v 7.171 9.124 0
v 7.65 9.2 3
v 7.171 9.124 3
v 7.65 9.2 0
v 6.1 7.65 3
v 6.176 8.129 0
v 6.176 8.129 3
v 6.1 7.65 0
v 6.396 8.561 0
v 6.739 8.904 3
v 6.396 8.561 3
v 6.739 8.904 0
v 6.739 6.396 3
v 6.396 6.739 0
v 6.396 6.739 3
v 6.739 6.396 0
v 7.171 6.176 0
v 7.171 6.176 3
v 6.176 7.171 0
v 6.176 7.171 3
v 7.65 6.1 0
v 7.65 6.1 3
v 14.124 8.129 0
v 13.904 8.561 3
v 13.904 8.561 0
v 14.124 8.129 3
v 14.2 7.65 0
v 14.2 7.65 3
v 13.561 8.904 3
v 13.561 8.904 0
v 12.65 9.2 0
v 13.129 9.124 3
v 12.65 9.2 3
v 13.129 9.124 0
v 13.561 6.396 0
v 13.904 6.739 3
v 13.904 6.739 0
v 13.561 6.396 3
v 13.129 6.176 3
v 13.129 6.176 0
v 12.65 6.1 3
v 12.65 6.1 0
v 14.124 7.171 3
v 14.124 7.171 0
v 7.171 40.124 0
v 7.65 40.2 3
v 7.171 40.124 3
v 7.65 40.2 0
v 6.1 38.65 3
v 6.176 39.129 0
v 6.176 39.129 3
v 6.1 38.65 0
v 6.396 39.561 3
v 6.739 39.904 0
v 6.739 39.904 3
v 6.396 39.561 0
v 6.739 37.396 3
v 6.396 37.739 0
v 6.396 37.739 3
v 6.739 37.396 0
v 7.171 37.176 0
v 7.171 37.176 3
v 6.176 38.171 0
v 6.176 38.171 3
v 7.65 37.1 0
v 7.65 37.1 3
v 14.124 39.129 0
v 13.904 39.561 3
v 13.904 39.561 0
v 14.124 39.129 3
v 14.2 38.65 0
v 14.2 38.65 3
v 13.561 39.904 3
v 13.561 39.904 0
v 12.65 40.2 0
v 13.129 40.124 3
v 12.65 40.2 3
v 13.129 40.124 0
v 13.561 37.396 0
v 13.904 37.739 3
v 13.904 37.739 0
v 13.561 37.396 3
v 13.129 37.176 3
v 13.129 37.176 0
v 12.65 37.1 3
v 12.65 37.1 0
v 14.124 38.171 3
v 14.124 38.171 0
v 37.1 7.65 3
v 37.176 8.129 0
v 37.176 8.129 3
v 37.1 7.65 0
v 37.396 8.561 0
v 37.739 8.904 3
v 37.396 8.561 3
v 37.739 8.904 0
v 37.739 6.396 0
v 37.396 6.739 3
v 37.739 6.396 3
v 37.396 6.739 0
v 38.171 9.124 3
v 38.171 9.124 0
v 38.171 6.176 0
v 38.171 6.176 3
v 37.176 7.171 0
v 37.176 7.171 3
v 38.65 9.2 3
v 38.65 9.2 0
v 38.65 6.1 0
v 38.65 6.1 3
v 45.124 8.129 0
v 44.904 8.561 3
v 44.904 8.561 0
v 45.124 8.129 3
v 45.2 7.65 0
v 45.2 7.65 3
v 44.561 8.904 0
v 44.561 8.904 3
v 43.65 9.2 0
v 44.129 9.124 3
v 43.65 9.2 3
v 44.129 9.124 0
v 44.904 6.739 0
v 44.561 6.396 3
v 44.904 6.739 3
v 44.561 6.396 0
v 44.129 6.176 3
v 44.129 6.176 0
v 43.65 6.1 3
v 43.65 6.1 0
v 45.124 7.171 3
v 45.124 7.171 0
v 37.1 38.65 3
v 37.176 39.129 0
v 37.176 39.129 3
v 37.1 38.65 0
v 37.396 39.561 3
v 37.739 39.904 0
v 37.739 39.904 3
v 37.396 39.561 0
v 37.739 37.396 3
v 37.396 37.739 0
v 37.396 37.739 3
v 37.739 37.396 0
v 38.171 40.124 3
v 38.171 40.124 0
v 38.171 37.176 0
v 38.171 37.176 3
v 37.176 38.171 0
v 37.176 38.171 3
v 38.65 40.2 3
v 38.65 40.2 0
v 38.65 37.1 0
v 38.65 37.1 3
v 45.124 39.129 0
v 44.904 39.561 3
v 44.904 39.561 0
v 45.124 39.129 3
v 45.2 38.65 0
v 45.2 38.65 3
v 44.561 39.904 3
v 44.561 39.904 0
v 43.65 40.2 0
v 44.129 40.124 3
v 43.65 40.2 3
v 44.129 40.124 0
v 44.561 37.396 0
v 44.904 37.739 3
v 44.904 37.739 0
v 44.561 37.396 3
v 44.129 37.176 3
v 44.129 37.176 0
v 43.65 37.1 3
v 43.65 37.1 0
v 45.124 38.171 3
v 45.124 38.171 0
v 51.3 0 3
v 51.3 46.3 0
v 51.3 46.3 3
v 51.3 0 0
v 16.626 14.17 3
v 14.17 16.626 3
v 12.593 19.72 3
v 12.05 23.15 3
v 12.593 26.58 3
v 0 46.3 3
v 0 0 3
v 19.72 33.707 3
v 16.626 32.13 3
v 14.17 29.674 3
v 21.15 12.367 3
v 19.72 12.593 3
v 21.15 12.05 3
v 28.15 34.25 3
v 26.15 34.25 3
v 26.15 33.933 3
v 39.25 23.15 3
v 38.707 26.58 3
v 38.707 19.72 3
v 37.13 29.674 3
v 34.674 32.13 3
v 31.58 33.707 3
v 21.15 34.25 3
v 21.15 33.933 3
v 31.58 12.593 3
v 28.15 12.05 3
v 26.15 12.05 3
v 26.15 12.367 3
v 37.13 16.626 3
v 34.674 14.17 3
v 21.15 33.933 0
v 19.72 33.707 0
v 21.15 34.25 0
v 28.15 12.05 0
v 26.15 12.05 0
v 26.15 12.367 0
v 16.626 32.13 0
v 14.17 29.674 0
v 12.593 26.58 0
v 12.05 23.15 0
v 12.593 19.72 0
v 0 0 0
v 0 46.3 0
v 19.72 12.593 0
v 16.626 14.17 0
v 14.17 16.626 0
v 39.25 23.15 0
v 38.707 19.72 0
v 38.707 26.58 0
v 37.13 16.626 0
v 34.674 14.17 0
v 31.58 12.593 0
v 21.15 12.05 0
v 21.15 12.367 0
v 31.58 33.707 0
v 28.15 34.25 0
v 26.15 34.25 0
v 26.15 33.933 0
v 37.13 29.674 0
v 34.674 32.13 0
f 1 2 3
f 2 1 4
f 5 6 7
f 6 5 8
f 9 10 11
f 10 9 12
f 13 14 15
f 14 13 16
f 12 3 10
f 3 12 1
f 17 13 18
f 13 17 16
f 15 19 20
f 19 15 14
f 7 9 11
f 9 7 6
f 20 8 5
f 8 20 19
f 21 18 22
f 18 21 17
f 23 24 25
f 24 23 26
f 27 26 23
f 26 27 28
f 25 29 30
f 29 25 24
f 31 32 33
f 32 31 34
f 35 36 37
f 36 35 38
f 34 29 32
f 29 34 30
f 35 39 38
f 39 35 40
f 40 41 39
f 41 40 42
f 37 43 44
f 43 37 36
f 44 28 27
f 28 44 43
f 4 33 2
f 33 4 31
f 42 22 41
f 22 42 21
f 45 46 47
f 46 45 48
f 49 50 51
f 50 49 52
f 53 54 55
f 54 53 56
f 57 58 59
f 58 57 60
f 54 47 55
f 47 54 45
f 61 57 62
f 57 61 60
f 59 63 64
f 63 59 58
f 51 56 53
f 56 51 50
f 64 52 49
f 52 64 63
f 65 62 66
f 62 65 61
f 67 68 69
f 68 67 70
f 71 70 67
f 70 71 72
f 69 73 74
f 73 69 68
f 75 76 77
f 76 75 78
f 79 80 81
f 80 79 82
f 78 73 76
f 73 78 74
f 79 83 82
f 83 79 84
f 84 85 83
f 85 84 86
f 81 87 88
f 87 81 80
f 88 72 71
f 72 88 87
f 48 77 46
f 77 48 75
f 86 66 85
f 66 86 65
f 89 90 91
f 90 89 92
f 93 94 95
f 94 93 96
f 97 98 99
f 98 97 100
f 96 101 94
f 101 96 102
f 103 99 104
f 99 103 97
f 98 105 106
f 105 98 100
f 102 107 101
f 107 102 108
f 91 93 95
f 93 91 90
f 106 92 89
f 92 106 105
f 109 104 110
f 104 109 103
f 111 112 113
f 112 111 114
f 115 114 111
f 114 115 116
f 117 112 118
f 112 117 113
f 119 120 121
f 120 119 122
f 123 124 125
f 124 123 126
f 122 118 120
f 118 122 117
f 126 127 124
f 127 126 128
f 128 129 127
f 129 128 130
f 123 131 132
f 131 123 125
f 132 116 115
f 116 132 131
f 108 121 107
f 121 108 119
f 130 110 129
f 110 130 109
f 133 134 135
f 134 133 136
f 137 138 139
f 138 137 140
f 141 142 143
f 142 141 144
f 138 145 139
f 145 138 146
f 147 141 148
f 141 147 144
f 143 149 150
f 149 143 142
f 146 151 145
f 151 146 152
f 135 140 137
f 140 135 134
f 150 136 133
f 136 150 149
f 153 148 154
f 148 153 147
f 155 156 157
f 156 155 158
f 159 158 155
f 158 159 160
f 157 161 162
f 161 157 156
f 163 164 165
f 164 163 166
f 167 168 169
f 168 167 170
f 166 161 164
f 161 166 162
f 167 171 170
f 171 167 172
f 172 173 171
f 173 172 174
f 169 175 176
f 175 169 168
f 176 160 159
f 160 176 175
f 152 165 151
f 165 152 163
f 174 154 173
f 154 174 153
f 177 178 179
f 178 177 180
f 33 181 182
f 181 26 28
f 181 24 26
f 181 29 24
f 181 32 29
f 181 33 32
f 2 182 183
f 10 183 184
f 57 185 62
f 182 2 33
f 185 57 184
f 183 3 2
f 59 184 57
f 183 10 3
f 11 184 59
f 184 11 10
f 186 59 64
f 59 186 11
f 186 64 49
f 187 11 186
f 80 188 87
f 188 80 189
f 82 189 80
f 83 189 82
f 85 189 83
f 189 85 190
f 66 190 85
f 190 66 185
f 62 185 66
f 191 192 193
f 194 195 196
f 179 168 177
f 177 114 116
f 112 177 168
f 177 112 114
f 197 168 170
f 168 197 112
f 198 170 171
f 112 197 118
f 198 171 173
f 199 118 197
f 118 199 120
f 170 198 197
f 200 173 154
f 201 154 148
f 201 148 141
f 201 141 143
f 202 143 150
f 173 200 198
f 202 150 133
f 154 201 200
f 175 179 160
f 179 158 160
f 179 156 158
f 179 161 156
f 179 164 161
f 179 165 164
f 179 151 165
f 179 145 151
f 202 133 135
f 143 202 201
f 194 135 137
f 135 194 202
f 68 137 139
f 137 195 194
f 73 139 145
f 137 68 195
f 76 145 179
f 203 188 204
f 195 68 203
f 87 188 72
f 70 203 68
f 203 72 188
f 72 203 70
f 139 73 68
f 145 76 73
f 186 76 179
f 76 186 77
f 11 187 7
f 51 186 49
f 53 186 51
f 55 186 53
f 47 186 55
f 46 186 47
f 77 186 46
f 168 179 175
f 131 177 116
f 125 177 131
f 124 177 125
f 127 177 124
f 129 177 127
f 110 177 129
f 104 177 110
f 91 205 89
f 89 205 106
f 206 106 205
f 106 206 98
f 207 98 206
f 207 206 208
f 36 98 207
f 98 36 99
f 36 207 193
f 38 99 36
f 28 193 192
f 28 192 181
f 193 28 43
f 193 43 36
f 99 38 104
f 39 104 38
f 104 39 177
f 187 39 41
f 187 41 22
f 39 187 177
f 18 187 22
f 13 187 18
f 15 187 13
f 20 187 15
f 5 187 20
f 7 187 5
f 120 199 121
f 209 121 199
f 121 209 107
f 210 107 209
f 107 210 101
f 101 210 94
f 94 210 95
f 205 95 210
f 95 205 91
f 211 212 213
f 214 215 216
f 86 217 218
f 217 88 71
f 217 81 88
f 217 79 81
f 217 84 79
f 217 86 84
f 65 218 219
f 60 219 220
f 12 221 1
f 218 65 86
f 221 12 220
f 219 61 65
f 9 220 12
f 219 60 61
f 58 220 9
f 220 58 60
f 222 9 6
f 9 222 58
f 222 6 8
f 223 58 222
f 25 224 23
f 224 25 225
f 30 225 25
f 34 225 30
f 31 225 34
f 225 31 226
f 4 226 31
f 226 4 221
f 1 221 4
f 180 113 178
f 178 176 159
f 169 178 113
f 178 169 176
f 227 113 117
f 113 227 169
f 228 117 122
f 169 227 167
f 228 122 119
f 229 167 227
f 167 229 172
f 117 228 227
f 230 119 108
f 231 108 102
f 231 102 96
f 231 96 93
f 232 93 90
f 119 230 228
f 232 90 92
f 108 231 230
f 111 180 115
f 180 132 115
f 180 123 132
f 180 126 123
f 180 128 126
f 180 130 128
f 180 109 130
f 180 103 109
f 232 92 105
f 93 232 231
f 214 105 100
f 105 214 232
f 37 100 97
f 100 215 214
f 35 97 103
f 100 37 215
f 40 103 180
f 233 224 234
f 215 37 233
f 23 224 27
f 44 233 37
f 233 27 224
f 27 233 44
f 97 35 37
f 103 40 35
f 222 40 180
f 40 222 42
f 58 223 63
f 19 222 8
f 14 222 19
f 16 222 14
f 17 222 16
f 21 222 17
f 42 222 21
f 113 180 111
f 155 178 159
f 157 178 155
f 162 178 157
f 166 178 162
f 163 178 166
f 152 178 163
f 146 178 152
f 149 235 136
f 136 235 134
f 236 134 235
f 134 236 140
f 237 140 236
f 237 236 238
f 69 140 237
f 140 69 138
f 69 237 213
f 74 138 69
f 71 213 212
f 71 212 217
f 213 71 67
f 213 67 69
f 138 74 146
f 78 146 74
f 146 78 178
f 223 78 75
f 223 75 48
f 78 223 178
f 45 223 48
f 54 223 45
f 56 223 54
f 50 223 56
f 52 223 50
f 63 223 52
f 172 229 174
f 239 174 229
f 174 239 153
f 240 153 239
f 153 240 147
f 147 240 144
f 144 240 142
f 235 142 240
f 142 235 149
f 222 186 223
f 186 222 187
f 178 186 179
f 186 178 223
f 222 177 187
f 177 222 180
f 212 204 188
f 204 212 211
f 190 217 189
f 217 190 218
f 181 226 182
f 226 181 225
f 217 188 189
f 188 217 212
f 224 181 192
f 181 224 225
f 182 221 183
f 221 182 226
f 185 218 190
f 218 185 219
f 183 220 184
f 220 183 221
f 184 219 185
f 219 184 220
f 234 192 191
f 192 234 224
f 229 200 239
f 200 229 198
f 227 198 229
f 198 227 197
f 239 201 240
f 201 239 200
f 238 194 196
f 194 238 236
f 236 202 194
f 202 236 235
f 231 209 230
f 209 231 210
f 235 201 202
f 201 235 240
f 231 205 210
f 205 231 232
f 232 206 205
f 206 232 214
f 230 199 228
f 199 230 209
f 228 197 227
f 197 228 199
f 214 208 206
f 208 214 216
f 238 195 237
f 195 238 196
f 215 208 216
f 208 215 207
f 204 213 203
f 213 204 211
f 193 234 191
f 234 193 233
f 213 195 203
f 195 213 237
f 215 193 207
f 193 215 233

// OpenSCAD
module draw_nema(v, length)
{
	// Body size
	bs = v[0];
	// Hole spacing
	hs = v[1];
	// Hole offset
	ho = (bs - hs) / 2;
	// Hole diameter
	hd = v[2];
	// Hole radius
	hr = hd / 2;
	// Hole depth
	hd = v[3];
	// Center
	c = bs / 2;
	// Shoulder height
	sh = v[4];
	// Shoulder diameter
	sd = v[5];
	// shoulder radius
	sr = sd / 2;
	// Shaft length
	sfl = v[6];
	// Shaft diameter
	sfd = v[7];
	// Shaft radius
	sfr = sfd / 2;

	echo(bs);
	echo (bs-ho);

	difference()
	{
		union()
		{
			color([0.5,0.5,0.5]) cube([bs,length,bs]);
			translate([c,-sh,c]) rotate([270,0,0])
				color([0.7,0.7,0.7]) cylinder(r = sr, h = sh);
			translate([c,-sfl,c]) rotate([270,0,0])
				color([0.8,0.8,0.8]) cylinder(r = sfr, h = sfl);
		}
		translate([ho,-0.1,ho]) rotate([270,0,0])
			cylinder(r = hr, h = hd + 0.1);
		translate([bs-ho,-0.1,ho]) rotate([270,0,0])
			cylinder(r = hr, h = hd + 0.1);
		translate([ho,-0.1,bs-ho]) rotate([270,0,0])
			cylinder(r = hr, h = hd + 0.1);
		translate([bs-ho,-0.1,bs-ho]) rotate([270,0,0])
			cylinder(r = hr, h = hd + 0.1);
	}
}

module draw_nema_plate(v, slot_len=0, thickness = 3, margin = 0)
{
	// Body size
	bs = v[0];
	// Hole spacing
	hs = v[1];
	// Hole diameter
	hd = v[2];
	// Hole radius
	hr = hd / 2;
	// Total slot len
	tsl = slot_len + hd;
	// Total len
	len = bs + slot_len + (margin * 2);
	// Total hgt
	hgt = bs + (margin * 2);
	// Center
	c_y = hgt / 2;
	c_x = len / 2;
	// Hole offset from ctr
	ho = hs / 2;
	// Shoulder diameter
	sd = v[5];
	// shoulder radius
	sr = sd / 2;

	difference()
	{
		cube([len, hgt, thickness]);
		translate([c_x - (slot_len / 2), c_y, -0.1])
			cylinder(r=sr + 0.1, h=thickness + 0.2);
		translate([c_x + (slot_len / 2), c_y, -0.1])
			cylinder(r=sr + 0.1, h=thickness + 0.2);
		translate([bs / 2, ((hgt - sd) / 2) - 0.1, -0.1])
			cube([slot_len, sd + 0.2, thickness + 0.2]);

		for(c = [[c_x - ho, c_y - ho], [c_x - ho, c_y + ho],
				  [c_x + ho, c_y - ho], [c_x + ho, c_y + ho]])
		{
			translate([c[0] - (slot_len / 2), c[1], -0.1])
				cylinder(r=hr + 0.05, h=thickness + 0.2);
			translate([c[0] + (slot_len / 2), c[1], -0.1])
				cylinder(r=hr + 0.05, h=thickness + 0.2);
			translate([c[0] - (slot_len / 2), c[1] - (hr + 0.05), -0.1])
				cube([slot_len, hd + 0.1, thickness + 0.2]);			
		}
	}
}

nema_17_dims = [42.3,31,3,4.5,2,22,24,5];
nema_23_dims = [57,47,5.1,4.5,2,38.1,24,10];

function get_nema_17_size() = nema_17_dims[0];
function get_nema_23_size() = nema_23_dims[0];

module nema_17(length)
{
	v=[42.3,31,3,4.5,2,22,24,5];
	draw_nema(v, length);
}

module nema_17_dual(length)
{
	v=[42.3,31,3,4.5,2,22,19.5,5];
	c = v[0] / 2;
	sfr = v[7] / 2;
	union()
	{
		draw_nema(v, length);
		translate([c,length,c]) rotate([270,0,0])
			color([0.8,0.8,0.8]) cylinder(r = sfr, h = 13);
	}
}

module nema_17_plate(slot_len=0, thickness = 3, margin = 0)
{
	v=[42.3,31,3,4.5,2,22,24,5];

	draw_nema_plate(v, slot_len, thickness, margin);
}

module nema_23(length)
{
	v=[57,47,5.1,4.5,2,38.1,24,10];
	draw_nema(v, length);
}

module nema_23_plate(slot_len=0, thickness = 3)
{
	v=[57,47,5.1,4.5,2,38.1,24,10];
	draw_nema_plate(v, slot_len, thickness);
}

$fn = 20;
nema_17_plate(slot_len=5, margin=2);
//nema_17_dual(42.3);
//translate([60,0,0]) nema_23(57);
